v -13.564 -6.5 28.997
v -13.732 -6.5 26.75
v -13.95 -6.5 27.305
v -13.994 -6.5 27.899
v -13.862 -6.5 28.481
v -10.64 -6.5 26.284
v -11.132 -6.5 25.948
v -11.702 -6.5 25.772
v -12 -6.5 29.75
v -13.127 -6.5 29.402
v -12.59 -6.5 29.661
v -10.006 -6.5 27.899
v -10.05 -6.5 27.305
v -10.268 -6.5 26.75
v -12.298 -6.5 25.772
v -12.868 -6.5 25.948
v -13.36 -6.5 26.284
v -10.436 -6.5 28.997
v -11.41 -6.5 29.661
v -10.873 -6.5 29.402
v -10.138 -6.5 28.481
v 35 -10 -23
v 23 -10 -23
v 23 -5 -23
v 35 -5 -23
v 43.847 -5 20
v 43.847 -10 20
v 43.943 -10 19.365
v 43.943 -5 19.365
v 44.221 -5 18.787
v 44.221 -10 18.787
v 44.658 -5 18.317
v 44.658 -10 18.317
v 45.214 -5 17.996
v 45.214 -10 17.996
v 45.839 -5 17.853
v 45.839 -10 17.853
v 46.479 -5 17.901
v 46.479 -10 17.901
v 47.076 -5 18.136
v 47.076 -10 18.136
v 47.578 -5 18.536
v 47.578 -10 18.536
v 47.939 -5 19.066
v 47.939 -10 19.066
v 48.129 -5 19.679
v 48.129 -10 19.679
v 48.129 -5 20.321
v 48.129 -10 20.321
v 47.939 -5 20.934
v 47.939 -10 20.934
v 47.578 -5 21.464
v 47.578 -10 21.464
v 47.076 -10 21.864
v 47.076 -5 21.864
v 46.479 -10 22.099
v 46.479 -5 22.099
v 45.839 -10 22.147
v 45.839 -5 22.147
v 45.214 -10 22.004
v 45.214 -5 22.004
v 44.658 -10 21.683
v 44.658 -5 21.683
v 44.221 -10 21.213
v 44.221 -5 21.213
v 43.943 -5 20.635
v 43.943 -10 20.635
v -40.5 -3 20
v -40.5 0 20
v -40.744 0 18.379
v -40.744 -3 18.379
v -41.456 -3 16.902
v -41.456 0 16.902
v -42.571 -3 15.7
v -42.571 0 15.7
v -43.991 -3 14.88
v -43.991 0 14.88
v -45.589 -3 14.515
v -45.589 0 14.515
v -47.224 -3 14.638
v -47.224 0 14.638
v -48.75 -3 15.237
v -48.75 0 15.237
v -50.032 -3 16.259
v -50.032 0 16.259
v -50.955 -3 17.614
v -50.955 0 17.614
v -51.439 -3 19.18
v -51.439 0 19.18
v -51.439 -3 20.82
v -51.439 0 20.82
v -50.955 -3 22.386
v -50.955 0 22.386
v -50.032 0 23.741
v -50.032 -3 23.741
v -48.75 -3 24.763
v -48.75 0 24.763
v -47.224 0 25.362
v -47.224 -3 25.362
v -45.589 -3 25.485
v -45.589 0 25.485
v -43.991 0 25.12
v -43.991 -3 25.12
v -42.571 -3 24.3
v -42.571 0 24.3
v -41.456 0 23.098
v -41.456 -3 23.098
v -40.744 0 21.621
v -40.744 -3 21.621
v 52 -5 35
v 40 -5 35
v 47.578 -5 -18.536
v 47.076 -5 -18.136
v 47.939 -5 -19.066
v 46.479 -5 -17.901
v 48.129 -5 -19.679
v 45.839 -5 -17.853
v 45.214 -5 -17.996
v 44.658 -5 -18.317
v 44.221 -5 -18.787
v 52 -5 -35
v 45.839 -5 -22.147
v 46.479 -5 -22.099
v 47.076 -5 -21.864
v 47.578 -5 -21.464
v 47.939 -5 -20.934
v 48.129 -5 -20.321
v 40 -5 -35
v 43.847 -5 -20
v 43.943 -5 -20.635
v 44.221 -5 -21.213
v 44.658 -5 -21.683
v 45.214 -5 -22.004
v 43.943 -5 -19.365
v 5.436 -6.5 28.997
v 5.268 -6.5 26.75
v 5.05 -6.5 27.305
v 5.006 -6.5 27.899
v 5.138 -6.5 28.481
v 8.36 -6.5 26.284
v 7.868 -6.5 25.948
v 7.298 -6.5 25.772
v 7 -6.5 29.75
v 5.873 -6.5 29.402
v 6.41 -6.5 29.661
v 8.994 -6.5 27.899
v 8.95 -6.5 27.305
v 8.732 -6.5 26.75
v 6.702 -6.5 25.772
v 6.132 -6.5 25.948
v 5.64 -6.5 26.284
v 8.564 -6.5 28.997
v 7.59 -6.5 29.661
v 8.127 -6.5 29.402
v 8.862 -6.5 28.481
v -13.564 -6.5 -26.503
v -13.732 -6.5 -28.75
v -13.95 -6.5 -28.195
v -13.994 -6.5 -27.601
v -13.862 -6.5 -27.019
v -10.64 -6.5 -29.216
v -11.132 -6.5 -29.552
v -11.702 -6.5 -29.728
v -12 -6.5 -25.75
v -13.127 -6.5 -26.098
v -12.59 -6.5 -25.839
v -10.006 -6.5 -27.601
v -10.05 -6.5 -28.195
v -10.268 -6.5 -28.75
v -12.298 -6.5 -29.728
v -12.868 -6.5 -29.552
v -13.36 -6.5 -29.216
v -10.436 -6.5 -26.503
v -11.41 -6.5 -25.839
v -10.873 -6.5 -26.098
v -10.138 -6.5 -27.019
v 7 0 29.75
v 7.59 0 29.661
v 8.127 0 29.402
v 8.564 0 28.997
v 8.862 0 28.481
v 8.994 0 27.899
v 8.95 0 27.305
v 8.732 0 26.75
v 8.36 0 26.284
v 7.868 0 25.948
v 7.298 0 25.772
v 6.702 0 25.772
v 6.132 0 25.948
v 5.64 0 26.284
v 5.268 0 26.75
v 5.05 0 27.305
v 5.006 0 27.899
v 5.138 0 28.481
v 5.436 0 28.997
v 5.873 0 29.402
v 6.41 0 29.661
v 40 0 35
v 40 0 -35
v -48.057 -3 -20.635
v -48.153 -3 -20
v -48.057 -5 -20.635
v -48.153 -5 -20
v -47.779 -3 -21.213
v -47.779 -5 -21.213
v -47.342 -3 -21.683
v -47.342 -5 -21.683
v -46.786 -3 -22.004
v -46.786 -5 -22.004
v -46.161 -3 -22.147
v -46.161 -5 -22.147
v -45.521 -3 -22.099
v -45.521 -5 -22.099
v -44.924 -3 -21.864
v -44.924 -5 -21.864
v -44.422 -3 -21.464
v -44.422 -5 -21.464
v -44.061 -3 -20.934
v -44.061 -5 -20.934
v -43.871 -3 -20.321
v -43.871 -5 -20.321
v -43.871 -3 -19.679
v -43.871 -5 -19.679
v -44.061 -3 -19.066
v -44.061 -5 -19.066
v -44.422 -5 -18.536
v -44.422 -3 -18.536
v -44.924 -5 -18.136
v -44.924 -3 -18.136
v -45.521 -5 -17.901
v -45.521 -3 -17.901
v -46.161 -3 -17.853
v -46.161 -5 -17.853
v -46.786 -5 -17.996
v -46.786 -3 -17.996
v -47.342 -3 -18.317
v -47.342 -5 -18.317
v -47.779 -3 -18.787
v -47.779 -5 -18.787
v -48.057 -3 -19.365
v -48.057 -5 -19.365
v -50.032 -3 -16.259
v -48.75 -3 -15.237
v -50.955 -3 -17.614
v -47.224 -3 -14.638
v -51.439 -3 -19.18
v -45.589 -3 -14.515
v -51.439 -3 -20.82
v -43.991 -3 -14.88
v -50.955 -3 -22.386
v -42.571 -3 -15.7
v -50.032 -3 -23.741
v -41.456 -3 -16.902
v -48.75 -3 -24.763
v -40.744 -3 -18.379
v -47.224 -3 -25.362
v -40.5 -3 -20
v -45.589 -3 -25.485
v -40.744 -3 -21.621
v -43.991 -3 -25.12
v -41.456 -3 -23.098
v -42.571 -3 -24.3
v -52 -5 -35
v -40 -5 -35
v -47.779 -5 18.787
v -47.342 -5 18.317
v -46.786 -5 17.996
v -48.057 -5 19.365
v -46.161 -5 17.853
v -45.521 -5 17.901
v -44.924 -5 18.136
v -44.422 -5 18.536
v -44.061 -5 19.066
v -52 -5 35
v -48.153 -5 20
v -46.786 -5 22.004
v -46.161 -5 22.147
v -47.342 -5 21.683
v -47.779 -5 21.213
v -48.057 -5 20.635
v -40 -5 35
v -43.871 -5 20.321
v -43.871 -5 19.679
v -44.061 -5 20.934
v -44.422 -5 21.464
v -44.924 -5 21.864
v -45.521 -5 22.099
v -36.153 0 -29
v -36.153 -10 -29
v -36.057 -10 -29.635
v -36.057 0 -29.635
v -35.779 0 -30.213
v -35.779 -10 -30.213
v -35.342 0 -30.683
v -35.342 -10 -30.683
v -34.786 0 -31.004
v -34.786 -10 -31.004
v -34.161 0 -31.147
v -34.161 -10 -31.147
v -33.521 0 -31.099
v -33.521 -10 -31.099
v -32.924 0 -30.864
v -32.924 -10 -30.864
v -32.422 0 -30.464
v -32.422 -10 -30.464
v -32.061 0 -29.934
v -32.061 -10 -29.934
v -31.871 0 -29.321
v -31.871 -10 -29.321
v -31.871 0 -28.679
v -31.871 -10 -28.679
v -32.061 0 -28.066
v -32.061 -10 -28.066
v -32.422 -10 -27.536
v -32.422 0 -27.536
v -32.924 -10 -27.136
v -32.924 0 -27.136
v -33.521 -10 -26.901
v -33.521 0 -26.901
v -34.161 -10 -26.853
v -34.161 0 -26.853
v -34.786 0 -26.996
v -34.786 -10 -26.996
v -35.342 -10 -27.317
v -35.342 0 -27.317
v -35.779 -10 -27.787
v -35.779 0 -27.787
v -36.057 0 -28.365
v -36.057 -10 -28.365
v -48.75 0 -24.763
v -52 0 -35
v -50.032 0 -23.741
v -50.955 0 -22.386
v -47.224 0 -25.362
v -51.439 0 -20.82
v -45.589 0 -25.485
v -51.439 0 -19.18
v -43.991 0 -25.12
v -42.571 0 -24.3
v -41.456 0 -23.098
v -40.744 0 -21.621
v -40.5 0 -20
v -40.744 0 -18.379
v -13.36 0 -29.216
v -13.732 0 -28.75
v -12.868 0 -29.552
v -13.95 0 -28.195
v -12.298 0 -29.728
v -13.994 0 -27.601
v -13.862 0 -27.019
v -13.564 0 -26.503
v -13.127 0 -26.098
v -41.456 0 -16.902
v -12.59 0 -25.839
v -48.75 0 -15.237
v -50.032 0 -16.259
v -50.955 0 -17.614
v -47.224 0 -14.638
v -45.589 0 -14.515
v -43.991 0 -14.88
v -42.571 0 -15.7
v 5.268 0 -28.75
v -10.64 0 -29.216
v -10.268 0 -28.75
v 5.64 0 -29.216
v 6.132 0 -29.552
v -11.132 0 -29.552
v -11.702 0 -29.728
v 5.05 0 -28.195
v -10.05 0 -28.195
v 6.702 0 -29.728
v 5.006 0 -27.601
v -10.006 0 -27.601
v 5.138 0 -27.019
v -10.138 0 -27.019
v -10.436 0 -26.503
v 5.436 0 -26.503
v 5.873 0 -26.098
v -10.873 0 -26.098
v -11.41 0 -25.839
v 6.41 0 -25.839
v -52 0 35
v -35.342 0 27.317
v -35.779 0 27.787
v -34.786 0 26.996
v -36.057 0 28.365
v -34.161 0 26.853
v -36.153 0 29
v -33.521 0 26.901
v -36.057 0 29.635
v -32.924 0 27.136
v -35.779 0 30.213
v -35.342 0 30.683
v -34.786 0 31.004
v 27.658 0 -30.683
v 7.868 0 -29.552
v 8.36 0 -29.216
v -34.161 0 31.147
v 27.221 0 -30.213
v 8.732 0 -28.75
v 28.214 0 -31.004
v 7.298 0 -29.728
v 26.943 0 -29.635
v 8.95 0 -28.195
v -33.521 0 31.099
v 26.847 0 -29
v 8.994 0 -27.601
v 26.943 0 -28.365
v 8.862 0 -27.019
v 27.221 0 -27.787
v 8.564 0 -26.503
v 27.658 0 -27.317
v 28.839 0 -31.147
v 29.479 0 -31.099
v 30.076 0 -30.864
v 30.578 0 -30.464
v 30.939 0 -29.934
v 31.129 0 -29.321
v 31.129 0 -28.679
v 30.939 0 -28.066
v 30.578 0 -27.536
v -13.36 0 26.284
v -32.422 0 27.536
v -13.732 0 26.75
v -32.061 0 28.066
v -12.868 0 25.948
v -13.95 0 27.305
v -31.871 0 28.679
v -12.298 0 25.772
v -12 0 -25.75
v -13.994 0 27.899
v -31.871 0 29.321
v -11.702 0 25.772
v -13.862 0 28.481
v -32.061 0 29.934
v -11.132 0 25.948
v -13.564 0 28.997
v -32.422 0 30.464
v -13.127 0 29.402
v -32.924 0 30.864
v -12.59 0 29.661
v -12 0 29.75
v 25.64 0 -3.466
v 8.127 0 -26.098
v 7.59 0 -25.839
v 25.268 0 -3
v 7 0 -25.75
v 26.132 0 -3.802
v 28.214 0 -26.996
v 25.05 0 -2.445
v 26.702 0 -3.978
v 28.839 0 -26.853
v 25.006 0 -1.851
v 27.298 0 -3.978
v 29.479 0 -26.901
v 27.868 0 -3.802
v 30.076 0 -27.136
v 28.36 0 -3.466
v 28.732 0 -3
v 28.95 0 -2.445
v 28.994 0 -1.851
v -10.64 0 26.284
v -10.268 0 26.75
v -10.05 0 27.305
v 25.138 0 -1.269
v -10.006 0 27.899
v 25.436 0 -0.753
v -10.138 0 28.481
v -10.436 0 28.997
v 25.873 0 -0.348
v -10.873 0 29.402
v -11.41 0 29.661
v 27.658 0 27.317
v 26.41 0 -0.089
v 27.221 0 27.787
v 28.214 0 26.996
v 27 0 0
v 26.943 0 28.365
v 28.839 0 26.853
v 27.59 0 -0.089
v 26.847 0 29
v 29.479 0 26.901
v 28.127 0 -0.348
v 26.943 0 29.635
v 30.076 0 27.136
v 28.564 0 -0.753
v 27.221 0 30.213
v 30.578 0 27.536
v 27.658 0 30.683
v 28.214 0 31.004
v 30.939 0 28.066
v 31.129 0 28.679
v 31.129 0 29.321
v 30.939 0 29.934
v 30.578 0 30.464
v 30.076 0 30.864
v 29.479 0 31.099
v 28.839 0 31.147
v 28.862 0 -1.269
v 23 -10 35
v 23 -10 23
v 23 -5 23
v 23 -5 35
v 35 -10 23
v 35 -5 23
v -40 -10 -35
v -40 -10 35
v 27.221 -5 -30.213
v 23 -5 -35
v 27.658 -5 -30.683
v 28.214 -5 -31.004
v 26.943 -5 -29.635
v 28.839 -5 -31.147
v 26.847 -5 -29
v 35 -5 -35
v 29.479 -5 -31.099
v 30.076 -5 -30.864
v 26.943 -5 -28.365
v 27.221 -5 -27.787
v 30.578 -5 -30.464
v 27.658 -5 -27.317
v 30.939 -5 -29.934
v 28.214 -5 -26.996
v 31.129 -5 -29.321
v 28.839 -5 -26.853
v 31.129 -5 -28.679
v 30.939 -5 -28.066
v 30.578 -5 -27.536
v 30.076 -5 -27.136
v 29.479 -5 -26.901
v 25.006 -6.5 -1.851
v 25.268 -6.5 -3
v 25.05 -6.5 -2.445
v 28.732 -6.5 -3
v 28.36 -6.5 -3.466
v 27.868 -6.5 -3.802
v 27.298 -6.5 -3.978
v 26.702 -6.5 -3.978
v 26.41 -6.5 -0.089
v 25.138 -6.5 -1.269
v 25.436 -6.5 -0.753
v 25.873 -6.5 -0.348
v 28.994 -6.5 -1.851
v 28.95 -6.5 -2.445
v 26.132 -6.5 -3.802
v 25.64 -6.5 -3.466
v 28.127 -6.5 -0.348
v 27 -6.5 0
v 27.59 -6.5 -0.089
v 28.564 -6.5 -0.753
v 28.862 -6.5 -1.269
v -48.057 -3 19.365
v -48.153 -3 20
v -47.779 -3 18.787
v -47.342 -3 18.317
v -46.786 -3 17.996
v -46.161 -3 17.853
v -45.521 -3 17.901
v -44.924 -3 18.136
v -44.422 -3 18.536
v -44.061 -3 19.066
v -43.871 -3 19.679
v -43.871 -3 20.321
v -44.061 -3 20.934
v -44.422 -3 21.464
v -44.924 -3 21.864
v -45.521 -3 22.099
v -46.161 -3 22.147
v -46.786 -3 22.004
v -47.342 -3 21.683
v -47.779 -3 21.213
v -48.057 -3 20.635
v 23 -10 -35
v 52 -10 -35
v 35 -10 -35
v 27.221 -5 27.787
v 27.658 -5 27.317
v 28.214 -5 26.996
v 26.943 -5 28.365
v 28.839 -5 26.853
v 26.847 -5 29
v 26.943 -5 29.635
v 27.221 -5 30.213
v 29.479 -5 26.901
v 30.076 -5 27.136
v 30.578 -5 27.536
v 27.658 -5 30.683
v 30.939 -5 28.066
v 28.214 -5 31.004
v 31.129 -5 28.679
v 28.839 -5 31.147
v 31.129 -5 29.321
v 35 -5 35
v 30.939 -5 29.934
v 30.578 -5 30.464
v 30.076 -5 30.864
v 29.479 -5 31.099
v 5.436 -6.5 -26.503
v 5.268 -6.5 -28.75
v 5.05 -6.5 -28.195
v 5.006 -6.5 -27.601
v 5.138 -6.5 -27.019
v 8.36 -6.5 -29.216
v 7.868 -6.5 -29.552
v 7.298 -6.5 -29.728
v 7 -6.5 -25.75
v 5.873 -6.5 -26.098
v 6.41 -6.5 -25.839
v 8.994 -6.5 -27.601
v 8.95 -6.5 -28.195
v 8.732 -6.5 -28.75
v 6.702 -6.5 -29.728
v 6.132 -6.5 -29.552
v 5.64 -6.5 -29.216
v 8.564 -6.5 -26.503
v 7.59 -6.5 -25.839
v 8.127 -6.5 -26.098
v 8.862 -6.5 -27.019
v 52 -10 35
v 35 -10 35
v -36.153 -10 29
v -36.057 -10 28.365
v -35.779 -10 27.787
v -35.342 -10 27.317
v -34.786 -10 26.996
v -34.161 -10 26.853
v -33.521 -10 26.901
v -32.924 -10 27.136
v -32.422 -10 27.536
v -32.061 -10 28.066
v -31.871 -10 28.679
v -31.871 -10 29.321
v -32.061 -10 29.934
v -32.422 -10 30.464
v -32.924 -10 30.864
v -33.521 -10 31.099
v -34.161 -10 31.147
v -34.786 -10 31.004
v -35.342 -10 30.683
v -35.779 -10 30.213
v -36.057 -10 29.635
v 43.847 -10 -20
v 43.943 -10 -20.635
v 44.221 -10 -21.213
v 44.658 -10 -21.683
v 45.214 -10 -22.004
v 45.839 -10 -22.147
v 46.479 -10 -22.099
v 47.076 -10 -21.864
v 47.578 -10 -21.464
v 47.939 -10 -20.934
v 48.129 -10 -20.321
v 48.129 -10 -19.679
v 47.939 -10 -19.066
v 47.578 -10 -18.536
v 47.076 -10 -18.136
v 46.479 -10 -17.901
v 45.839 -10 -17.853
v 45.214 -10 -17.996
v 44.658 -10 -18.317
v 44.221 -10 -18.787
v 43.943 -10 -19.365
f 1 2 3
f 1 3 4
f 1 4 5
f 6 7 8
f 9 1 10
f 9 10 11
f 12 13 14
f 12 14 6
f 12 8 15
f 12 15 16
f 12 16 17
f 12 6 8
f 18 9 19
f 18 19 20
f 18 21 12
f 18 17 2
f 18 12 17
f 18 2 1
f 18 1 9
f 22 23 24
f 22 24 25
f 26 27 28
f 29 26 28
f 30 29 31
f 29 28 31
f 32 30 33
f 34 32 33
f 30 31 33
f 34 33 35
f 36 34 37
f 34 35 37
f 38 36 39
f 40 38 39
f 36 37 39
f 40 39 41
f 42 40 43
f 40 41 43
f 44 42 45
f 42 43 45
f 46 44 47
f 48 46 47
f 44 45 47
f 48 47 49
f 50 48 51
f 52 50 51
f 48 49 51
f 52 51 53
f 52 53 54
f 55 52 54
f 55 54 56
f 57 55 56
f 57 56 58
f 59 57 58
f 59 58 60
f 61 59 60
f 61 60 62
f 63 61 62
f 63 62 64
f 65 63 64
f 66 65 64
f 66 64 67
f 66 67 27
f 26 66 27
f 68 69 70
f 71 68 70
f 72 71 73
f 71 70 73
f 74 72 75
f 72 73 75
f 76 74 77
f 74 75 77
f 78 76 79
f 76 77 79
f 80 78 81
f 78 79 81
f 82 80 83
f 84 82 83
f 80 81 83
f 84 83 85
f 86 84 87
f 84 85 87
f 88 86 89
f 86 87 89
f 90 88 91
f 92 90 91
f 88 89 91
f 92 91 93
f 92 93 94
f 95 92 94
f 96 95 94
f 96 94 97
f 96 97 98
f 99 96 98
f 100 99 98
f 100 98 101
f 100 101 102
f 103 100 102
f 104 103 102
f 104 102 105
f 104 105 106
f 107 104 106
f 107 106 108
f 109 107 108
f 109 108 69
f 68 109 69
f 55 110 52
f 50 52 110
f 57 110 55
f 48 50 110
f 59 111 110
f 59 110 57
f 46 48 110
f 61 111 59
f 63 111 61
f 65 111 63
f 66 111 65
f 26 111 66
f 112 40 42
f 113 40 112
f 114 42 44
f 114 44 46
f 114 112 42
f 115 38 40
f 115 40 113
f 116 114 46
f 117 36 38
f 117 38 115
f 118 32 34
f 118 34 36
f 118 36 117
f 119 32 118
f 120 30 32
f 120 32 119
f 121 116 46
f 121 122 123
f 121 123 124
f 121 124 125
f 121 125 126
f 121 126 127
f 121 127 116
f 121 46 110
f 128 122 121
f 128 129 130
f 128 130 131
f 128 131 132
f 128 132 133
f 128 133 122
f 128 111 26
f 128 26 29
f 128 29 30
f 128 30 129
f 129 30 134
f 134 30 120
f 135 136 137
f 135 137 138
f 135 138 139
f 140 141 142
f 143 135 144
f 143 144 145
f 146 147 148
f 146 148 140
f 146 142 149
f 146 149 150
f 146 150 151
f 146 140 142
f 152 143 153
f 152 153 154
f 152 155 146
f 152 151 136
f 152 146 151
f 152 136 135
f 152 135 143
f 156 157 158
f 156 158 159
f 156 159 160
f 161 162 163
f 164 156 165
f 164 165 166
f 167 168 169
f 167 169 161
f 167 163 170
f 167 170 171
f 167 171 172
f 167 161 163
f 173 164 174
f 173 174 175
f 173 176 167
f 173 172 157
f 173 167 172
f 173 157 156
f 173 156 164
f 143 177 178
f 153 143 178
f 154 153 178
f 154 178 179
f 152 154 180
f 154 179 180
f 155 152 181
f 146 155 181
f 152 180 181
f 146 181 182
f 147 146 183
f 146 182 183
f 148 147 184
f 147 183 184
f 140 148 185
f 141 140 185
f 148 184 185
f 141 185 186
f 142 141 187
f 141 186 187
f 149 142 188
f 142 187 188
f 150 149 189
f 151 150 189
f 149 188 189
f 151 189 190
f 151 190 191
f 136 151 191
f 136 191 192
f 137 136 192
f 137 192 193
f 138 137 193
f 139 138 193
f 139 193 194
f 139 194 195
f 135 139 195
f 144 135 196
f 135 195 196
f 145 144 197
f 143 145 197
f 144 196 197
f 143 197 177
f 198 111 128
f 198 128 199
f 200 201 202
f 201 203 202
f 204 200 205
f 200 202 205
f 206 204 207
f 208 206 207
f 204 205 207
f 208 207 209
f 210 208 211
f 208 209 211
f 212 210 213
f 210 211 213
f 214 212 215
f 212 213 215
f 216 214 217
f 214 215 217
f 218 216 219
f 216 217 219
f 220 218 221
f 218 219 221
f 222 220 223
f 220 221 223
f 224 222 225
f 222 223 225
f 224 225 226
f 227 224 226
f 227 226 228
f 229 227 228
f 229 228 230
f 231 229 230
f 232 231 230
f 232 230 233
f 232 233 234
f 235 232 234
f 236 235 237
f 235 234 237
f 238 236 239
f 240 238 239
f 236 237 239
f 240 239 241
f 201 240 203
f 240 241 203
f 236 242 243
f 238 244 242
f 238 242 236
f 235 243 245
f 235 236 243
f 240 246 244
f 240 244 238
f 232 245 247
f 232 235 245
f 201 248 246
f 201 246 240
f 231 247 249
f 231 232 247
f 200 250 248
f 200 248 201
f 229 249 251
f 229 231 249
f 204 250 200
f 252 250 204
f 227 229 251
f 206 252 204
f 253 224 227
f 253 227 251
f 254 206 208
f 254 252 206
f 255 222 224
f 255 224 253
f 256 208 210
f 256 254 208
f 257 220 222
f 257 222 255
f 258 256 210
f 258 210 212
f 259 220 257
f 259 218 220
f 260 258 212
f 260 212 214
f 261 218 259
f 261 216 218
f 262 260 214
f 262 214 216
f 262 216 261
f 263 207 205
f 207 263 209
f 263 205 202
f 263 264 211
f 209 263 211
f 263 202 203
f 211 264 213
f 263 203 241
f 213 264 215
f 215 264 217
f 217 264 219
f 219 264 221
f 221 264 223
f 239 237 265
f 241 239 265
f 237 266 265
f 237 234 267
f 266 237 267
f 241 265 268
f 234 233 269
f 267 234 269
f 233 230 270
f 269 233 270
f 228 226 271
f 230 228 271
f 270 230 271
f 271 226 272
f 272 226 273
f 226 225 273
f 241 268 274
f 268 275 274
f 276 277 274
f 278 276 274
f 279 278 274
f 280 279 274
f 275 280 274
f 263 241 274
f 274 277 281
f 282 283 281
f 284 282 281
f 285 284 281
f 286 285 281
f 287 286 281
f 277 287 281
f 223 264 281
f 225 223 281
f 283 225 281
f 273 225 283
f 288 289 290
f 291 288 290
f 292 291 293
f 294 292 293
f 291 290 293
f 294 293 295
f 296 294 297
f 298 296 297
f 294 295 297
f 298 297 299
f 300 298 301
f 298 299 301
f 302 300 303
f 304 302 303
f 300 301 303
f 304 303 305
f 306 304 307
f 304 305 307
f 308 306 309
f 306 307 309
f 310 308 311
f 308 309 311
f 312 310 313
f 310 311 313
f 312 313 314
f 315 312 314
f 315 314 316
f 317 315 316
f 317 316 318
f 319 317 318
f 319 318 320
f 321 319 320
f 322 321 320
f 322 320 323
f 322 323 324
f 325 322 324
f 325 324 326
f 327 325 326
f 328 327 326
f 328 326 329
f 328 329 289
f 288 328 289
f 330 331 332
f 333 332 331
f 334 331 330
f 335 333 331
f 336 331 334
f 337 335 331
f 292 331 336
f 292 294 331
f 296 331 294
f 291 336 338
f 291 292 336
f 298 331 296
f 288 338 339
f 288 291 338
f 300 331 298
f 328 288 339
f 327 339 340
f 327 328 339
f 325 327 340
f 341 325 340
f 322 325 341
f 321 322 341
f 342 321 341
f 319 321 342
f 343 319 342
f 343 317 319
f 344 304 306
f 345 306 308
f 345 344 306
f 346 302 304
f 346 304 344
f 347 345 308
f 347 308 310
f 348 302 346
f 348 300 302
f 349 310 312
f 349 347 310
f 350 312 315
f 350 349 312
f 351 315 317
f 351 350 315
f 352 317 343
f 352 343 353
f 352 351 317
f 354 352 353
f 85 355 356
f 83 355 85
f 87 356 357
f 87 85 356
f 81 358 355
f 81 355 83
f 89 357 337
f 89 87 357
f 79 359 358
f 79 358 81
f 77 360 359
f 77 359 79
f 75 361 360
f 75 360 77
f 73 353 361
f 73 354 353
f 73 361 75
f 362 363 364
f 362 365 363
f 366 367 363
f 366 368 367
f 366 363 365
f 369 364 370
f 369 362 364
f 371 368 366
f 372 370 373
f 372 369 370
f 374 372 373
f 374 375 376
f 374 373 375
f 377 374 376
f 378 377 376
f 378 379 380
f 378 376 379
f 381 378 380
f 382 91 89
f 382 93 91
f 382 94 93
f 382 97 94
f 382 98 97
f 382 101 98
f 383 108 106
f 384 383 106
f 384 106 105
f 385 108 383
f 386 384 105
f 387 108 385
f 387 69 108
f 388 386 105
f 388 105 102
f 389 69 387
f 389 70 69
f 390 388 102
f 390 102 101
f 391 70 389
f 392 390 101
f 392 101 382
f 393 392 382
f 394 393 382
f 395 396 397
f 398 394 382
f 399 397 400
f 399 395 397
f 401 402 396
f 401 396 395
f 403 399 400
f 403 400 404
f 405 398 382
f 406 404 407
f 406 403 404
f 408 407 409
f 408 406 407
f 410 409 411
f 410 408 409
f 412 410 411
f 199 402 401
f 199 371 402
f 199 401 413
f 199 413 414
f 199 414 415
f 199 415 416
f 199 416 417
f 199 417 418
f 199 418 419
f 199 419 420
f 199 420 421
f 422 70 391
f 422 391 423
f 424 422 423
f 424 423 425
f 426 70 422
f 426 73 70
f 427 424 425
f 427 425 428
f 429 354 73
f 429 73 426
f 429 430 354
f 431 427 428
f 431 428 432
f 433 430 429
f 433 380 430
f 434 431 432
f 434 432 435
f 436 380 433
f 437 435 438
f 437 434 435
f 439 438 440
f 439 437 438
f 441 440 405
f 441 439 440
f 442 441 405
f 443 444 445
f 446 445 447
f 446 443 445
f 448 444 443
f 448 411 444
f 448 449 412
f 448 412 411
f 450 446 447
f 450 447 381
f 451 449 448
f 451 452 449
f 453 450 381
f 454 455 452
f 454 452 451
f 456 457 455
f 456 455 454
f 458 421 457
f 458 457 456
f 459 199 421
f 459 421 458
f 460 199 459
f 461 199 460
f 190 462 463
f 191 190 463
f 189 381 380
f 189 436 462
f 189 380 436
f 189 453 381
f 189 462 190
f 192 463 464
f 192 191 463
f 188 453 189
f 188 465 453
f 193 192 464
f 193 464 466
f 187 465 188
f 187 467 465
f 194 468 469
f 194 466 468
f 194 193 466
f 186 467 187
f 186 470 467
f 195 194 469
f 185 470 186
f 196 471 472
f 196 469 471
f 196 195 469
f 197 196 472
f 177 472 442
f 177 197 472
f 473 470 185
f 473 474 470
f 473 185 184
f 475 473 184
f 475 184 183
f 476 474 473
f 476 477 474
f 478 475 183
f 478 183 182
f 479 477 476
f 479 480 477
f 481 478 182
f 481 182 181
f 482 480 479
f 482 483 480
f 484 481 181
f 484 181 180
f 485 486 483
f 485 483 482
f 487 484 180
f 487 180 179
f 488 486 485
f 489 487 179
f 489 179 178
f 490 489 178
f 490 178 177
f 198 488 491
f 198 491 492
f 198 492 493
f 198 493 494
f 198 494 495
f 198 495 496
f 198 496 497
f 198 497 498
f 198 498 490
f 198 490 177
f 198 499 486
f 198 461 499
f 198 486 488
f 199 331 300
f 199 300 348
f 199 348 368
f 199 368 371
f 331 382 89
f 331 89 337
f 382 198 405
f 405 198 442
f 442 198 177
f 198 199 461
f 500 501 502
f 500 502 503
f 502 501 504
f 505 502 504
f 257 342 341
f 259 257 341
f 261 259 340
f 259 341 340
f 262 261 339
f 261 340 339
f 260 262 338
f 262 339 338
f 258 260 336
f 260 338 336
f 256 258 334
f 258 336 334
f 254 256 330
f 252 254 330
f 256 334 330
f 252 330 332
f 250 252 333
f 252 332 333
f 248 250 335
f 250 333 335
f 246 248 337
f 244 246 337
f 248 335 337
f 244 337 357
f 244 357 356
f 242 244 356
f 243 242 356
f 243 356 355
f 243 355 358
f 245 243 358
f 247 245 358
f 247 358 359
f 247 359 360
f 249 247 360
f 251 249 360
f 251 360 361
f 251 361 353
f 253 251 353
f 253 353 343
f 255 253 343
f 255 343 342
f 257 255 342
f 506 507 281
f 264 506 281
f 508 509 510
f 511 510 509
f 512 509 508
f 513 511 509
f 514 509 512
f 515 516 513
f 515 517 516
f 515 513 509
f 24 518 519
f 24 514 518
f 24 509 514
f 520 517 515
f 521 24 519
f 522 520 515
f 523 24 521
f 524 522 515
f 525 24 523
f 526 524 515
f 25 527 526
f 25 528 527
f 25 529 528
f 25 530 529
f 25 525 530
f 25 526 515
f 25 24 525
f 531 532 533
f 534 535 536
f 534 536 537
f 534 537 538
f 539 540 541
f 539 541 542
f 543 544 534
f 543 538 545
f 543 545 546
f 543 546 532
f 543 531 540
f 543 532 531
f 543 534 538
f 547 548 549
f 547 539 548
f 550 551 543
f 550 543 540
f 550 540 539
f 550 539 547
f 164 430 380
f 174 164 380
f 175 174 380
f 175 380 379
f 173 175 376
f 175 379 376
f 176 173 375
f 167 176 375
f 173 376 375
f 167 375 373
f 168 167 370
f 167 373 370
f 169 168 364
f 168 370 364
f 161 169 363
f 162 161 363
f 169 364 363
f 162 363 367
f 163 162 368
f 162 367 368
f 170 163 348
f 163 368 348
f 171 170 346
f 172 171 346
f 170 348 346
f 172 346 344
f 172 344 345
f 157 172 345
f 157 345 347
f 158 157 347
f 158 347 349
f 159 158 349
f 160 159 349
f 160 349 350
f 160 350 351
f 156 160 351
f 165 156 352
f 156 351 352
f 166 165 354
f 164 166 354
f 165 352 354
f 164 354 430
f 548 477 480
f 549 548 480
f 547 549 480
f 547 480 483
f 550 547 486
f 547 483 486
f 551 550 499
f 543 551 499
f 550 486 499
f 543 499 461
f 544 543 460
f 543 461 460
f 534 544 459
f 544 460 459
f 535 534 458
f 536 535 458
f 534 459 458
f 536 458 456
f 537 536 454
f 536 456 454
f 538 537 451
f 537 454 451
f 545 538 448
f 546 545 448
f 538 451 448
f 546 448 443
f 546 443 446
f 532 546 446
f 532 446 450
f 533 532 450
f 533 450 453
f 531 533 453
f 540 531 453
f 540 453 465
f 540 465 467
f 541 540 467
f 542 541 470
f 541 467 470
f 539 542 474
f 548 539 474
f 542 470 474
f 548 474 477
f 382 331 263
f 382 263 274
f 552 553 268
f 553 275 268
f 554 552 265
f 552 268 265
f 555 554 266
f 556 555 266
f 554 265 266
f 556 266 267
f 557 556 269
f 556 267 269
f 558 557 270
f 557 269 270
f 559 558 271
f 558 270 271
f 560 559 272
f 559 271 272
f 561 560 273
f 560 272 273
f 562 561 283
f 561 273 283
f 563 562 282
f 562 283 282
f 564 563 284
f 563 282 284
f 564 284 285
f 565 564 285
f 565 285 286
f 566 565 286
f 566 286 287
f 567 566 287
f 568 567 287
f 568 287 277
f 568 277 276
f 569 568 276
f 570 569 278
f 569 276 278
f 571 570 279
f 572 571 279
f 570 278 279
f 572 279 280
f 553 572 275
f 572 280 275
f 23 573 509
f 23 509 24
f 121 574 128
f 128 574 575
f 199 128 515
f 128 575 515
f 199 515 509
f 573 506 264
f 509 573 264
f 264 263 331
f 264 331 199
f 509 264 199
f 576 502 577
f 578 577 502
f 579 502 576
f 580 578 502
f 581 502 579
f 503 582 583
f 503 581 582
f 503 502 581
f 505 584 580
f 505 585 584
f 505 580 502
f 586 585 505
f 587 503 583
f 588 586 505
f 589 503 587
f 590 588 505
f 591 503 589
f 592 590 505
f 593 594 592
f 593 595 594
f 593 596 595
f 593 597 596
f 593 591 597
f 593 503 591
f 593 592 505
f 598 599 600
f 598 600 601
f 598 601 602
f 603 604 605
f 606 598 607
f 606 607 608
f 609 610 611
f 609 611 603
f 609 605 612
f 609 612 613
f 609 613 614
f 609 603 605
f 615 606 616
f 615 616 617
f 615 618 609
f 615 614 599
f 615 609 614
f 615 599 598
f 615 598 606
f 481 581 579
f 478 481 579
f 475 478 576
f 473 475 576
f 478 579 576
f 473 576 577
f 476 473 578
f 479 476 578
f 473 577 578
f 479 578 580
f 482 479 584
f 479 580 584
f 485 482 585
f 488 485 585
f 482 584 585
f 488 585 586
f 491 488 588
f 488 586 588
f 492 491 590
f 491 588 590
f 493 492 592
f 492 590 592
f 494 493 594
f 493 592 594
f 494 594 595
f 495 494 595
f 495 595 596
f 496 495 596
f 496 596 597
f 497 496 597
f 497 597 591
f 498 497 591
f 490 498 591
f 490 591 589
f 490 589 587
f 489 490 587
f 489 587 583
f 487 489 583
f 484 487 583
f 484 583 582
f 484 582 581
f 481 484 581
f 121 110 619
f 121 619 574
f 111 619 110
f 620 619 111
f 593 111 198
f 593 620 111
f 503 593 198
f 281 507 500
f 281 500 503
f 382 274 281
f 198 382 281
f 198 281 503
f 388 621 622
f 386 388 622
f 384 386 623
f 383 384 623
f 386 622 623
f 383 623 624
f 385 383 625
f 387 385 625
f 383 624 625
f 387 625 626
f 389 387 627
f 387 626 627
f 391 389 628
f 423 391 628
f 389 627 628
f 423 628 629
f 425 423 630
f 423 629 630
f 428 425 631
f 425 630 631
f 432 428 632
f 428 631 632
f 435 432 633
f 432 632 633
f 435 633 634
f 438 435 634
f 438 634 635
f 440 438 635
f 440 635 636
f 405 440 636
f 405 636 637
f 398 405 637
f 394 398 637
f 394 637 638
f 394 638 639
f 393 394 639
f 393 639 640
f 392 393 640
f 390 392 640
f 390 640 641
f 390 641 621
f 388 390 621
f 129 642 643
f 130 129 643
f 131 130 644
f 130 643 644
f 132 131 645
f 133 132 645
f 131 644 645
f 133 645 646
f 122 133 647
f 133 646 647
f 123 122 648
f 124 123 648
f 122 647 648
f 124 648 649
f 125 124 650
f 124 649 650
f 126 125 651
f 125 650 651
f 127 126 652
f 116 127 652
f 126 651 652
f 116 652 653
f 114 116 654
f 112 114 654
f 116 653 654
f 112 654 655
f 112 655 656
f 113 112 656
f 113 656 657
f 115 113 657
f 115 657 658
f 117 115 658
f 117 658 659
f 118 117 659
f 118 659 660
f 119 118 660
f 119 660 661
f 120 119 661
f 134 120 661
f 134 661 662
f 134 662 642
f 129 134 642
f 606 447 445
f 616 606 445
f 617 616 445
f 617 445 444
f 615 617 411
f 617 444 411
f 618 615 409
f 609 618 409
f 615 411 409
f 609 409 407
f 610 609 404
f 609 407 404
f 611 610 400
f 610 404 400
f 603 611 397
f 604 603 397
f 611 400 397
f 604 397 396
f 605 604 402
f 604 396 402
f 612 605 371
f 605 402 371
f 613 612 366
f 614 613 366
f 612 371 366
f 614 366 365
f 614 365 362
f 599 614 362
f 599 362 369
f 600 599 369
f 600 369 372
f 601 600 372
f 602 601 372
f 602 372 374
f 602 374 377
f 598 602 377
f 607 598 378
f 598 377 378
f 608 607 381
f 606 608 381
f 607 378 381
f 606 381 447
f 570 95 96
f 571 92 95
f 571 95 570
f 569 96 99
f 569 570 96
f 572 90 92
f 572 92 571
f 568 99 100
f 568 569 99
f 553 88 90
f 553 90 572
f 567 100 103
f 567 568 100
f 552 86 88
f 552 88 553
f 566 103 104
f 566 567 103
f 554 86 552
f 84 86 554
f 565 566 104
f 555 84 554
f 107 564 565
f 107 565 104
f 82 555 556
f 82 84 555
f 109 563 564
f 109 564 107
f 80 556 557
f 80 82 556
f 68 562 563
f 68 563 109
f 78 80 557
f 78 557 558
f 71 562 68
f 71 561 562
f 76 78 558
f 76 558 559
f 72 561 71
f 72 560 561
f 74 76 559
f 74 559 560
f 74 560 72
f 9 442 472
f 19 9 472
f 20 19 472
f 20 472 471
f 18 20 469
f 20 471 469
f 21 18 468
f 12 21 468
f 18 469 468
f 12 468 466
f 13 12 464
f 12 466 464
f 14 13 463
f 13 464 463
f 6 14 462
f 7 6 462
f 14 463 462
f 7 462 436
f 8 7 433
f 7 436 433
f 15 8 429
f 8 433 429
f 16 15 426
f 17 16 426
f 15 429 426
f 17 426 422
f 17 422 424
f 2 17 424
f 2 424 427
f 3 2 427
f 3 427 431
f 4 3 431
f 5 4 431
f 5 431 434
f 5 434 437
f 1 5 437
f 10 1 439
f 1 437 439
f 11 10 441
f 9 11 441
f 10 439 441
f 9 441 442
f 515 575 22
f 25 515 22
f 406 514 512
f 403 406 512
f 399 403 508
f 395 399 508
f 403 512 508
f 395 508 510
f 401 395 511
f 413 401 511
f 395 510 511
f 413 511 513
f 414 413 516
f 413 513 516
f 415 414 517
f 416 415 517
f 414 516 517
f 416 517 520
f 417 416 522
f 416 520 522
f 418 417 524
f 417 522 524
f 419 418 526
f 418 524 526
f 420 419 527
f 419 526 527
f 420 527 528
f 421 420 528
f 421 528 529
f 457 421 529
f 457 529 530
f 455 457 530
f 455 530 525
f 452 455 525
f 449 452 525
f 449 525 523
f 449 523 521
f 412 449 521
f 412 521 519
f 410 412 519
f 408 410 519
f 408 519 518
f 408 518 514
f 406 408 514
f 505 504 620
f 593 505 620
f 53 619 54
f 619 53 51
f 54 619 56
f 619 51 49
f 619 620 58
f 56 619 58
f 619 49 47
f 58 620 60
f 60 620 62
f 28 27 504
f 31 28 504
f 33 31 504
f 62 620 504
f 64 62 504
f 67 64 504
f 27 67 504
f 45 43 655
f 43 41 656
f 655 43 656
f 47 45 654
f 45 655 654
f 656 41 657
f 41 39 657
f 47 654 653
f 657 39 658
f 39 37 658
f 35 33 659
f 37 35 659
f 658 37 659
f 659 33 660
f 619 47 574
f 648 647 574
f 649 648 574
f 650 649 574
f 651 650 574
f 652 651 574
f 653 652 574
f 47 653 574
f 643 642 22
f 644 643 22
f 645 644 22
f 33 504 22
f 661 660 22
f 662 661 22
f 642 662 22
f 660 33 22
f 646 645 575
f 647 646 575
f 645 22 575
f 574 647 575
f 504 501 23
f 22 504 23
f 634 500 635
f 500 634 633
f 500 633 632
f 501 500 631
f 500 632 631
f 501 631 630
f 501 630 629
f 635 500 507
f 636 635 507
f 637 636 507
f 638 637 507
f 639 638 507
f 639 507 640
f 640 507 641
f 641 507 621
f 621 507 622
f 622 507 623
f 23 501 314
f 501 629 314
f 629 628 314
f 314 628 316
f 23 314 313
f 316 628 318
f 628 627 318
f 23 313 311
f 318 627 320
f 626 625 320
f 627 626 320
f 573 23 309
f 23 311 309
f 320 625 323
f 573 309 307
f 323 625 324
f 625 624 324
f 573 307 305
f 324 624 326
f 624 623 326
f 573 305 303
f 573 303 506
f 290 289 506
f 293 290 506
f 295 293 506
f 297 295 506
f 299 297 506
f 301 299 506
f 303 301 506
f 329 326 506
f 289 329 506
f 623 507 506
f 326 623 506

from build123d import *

# Parameters (mm, degrees)
BOSS_STRUCTURE_START                            = -40
BOSS_STRUCTURE_OUTLINE_W                        = 10
BOSS_STRUCTURE_OUTLINE_H                        = 70
BOSS_STRUCTURE_DEPTH                            = 80
SKETCH3_W                                       = 70
SKETCH3_H                                       = 5
BOSS_ATTACHE_AVANT_DEPTH                        = 12
SKETCH4_W                                       = 70
SKETCH4_H                                       = 5
BOSS_ATTACHE_ARRI_RE_DEPTH                      = 12
CBORE_FOR_6_PAN_HEAD_MACHINE_SCREW1_D           = 4.3053
CBORE_FOR_6_PAN_HEAD_MACHINE_SCREW1_CBORE_D     = 11.000000098
CBORE_FOR_6_PAN_HEAD_MACHINE_SCREW1_CBORE_DEPTH = 3.000000096
F_6_CLEARANCE_HOLE1_D                           = 4.3053
SKETCH10_W                                      = 12
SKETCH10_H                                      = 12
CUT_SUPPORT_LAT_DEPTH                           = 5
F_6_CLEARANCE_HOLE2_D                           = 4.3053
F_6_CLEARANCE_HOLE2_DEPTH                       = 10
BOARD_R                                         = 2
CUT_EXTRUDE2_DEPTH                              = 6.5


# Read off the part's stored shape, not the designer's step: Boss-Structure
with BuildPart() as part:
    # Boss-Structure outline → Boss-Structure (new body)
    with BuildSketch(Plane.YZ.offset(BOSS_STRUCTURE_START)):
        with Locations((-5, 0)):
            Rectangle(BOSS_STRUCTURE_OUTLINE_W, BOSS_STRUCTURE_OUTLINE_H)
    extrude(amount=BOSS_STRUCTURE_DEPTH)

    # Sketch3 → Boss-Attache avant (add)
    with BuildSketch(Plane.ZY.offset(40)):
        with Locations((0, -2.5)):
            Rectangle(SKETCH3_W, SKETCH3_H)
    extrude(amount=BOSS_ATTACHE_AVANT_DEPTH)

    # Sketch4 → Boss-Attache arrière (add)
    with BuildSketch(Plane(origin=(40, 0, 0), x_dir=(0, 0, -1), z_dir=(1, 0, 0))):
        with Locations((0, -7.5)):
            Rectangle(SKETCH4_W, SKETCH4_H)
    extrude(amount=BOSS_ATTACHE_ARRI_RE_DEPTH)

    # CBORE for #6 Pan Head Machine Screw1 (through all)
    with Locations(Plane(origin=(0, 0, 0), x_dir=(1, 0, 0), z_dir=(0, 1, 0))):
        with Locations((-46, 20), (-46, -20)):
            CounterBoreHole(CBORE_FOR_6_PAN_HEAD_MACHINE_SCREW1_D / 2, CBORE_FOR_6_PAN_HEAD_MACHINE_SCREW1_CBORE_D / 2, CBORE_FOR_6_PAN_HEAD_MACHINE_SCREW1_CBORE_DEPTH)

    # #6 Clearance Hole1 (through all)
    with Locations(Plane(origin=(0, -5, 0), x_dir=(1, 0, 0), z_dir=(0, 1, 0))):
        with Locations((46, 20), (46, -20)):
            Hole(F_6_CLEARANCE_HOLE1_D / 2)

    # Sketch10 → Cut-Support lat (cut)
    with BuildSketch(Plane.XZ.offset(10)):
        with Locations((29, 29)):
            Rectangle(SKETCH10_W, SKETCH10_H)
        with Locations((29, -29)):
            Rectangle(SKETCH10_W, SKETCH10_H)
    extrude(amount=-CUT_SUPPORT_LAT_DEPTH, mode=Mode.SUBTRACT)

    # #6 Clearance Hole2
    with Locations(Plane(origin=(0, 0, 0), x_dir=(1, 0, 0), z_dir=(0, 1, 0))):
        with Locations((-34, 29), (-34, -29), (29, -29), (29, 29)):
            Hole(F_6_CLEARANCE_HOLE2_D / 2, depth=F_6_CLEARANCE_HOLE2_DEPTH)

    # Board → Cut-Extrude2 (cut)
    with BuildSketch(Plane(origin=(0, 0, 0), x_dir=(1, 0, 0), z_dir=(0, 1, 0))):
        with Locations(Location((-12, 27.75, 0), (0, 0, 270))):
            Circle(BOARD_R)
        with Locations(Location((7, 27.75, 0), (0, 0, 270))):
            Circle(BOARD_R)
        with Locations(Location((-12, -27.75, 0), (0, 0, 270))):
            Circle(BOARD_R)
        with Locations(Location((7, -27.75, 0), (0, 0, 270))):
            Circle(BOARD_R)
        with Locations(Location((27, 2, 0), (0, 0, 270))):
            Circle(BOARD_R)
    extrude(amount=-CUT_EXTRUDE2_DEPTH, mode=Mode.SUBTRACT)


solid = part.part
